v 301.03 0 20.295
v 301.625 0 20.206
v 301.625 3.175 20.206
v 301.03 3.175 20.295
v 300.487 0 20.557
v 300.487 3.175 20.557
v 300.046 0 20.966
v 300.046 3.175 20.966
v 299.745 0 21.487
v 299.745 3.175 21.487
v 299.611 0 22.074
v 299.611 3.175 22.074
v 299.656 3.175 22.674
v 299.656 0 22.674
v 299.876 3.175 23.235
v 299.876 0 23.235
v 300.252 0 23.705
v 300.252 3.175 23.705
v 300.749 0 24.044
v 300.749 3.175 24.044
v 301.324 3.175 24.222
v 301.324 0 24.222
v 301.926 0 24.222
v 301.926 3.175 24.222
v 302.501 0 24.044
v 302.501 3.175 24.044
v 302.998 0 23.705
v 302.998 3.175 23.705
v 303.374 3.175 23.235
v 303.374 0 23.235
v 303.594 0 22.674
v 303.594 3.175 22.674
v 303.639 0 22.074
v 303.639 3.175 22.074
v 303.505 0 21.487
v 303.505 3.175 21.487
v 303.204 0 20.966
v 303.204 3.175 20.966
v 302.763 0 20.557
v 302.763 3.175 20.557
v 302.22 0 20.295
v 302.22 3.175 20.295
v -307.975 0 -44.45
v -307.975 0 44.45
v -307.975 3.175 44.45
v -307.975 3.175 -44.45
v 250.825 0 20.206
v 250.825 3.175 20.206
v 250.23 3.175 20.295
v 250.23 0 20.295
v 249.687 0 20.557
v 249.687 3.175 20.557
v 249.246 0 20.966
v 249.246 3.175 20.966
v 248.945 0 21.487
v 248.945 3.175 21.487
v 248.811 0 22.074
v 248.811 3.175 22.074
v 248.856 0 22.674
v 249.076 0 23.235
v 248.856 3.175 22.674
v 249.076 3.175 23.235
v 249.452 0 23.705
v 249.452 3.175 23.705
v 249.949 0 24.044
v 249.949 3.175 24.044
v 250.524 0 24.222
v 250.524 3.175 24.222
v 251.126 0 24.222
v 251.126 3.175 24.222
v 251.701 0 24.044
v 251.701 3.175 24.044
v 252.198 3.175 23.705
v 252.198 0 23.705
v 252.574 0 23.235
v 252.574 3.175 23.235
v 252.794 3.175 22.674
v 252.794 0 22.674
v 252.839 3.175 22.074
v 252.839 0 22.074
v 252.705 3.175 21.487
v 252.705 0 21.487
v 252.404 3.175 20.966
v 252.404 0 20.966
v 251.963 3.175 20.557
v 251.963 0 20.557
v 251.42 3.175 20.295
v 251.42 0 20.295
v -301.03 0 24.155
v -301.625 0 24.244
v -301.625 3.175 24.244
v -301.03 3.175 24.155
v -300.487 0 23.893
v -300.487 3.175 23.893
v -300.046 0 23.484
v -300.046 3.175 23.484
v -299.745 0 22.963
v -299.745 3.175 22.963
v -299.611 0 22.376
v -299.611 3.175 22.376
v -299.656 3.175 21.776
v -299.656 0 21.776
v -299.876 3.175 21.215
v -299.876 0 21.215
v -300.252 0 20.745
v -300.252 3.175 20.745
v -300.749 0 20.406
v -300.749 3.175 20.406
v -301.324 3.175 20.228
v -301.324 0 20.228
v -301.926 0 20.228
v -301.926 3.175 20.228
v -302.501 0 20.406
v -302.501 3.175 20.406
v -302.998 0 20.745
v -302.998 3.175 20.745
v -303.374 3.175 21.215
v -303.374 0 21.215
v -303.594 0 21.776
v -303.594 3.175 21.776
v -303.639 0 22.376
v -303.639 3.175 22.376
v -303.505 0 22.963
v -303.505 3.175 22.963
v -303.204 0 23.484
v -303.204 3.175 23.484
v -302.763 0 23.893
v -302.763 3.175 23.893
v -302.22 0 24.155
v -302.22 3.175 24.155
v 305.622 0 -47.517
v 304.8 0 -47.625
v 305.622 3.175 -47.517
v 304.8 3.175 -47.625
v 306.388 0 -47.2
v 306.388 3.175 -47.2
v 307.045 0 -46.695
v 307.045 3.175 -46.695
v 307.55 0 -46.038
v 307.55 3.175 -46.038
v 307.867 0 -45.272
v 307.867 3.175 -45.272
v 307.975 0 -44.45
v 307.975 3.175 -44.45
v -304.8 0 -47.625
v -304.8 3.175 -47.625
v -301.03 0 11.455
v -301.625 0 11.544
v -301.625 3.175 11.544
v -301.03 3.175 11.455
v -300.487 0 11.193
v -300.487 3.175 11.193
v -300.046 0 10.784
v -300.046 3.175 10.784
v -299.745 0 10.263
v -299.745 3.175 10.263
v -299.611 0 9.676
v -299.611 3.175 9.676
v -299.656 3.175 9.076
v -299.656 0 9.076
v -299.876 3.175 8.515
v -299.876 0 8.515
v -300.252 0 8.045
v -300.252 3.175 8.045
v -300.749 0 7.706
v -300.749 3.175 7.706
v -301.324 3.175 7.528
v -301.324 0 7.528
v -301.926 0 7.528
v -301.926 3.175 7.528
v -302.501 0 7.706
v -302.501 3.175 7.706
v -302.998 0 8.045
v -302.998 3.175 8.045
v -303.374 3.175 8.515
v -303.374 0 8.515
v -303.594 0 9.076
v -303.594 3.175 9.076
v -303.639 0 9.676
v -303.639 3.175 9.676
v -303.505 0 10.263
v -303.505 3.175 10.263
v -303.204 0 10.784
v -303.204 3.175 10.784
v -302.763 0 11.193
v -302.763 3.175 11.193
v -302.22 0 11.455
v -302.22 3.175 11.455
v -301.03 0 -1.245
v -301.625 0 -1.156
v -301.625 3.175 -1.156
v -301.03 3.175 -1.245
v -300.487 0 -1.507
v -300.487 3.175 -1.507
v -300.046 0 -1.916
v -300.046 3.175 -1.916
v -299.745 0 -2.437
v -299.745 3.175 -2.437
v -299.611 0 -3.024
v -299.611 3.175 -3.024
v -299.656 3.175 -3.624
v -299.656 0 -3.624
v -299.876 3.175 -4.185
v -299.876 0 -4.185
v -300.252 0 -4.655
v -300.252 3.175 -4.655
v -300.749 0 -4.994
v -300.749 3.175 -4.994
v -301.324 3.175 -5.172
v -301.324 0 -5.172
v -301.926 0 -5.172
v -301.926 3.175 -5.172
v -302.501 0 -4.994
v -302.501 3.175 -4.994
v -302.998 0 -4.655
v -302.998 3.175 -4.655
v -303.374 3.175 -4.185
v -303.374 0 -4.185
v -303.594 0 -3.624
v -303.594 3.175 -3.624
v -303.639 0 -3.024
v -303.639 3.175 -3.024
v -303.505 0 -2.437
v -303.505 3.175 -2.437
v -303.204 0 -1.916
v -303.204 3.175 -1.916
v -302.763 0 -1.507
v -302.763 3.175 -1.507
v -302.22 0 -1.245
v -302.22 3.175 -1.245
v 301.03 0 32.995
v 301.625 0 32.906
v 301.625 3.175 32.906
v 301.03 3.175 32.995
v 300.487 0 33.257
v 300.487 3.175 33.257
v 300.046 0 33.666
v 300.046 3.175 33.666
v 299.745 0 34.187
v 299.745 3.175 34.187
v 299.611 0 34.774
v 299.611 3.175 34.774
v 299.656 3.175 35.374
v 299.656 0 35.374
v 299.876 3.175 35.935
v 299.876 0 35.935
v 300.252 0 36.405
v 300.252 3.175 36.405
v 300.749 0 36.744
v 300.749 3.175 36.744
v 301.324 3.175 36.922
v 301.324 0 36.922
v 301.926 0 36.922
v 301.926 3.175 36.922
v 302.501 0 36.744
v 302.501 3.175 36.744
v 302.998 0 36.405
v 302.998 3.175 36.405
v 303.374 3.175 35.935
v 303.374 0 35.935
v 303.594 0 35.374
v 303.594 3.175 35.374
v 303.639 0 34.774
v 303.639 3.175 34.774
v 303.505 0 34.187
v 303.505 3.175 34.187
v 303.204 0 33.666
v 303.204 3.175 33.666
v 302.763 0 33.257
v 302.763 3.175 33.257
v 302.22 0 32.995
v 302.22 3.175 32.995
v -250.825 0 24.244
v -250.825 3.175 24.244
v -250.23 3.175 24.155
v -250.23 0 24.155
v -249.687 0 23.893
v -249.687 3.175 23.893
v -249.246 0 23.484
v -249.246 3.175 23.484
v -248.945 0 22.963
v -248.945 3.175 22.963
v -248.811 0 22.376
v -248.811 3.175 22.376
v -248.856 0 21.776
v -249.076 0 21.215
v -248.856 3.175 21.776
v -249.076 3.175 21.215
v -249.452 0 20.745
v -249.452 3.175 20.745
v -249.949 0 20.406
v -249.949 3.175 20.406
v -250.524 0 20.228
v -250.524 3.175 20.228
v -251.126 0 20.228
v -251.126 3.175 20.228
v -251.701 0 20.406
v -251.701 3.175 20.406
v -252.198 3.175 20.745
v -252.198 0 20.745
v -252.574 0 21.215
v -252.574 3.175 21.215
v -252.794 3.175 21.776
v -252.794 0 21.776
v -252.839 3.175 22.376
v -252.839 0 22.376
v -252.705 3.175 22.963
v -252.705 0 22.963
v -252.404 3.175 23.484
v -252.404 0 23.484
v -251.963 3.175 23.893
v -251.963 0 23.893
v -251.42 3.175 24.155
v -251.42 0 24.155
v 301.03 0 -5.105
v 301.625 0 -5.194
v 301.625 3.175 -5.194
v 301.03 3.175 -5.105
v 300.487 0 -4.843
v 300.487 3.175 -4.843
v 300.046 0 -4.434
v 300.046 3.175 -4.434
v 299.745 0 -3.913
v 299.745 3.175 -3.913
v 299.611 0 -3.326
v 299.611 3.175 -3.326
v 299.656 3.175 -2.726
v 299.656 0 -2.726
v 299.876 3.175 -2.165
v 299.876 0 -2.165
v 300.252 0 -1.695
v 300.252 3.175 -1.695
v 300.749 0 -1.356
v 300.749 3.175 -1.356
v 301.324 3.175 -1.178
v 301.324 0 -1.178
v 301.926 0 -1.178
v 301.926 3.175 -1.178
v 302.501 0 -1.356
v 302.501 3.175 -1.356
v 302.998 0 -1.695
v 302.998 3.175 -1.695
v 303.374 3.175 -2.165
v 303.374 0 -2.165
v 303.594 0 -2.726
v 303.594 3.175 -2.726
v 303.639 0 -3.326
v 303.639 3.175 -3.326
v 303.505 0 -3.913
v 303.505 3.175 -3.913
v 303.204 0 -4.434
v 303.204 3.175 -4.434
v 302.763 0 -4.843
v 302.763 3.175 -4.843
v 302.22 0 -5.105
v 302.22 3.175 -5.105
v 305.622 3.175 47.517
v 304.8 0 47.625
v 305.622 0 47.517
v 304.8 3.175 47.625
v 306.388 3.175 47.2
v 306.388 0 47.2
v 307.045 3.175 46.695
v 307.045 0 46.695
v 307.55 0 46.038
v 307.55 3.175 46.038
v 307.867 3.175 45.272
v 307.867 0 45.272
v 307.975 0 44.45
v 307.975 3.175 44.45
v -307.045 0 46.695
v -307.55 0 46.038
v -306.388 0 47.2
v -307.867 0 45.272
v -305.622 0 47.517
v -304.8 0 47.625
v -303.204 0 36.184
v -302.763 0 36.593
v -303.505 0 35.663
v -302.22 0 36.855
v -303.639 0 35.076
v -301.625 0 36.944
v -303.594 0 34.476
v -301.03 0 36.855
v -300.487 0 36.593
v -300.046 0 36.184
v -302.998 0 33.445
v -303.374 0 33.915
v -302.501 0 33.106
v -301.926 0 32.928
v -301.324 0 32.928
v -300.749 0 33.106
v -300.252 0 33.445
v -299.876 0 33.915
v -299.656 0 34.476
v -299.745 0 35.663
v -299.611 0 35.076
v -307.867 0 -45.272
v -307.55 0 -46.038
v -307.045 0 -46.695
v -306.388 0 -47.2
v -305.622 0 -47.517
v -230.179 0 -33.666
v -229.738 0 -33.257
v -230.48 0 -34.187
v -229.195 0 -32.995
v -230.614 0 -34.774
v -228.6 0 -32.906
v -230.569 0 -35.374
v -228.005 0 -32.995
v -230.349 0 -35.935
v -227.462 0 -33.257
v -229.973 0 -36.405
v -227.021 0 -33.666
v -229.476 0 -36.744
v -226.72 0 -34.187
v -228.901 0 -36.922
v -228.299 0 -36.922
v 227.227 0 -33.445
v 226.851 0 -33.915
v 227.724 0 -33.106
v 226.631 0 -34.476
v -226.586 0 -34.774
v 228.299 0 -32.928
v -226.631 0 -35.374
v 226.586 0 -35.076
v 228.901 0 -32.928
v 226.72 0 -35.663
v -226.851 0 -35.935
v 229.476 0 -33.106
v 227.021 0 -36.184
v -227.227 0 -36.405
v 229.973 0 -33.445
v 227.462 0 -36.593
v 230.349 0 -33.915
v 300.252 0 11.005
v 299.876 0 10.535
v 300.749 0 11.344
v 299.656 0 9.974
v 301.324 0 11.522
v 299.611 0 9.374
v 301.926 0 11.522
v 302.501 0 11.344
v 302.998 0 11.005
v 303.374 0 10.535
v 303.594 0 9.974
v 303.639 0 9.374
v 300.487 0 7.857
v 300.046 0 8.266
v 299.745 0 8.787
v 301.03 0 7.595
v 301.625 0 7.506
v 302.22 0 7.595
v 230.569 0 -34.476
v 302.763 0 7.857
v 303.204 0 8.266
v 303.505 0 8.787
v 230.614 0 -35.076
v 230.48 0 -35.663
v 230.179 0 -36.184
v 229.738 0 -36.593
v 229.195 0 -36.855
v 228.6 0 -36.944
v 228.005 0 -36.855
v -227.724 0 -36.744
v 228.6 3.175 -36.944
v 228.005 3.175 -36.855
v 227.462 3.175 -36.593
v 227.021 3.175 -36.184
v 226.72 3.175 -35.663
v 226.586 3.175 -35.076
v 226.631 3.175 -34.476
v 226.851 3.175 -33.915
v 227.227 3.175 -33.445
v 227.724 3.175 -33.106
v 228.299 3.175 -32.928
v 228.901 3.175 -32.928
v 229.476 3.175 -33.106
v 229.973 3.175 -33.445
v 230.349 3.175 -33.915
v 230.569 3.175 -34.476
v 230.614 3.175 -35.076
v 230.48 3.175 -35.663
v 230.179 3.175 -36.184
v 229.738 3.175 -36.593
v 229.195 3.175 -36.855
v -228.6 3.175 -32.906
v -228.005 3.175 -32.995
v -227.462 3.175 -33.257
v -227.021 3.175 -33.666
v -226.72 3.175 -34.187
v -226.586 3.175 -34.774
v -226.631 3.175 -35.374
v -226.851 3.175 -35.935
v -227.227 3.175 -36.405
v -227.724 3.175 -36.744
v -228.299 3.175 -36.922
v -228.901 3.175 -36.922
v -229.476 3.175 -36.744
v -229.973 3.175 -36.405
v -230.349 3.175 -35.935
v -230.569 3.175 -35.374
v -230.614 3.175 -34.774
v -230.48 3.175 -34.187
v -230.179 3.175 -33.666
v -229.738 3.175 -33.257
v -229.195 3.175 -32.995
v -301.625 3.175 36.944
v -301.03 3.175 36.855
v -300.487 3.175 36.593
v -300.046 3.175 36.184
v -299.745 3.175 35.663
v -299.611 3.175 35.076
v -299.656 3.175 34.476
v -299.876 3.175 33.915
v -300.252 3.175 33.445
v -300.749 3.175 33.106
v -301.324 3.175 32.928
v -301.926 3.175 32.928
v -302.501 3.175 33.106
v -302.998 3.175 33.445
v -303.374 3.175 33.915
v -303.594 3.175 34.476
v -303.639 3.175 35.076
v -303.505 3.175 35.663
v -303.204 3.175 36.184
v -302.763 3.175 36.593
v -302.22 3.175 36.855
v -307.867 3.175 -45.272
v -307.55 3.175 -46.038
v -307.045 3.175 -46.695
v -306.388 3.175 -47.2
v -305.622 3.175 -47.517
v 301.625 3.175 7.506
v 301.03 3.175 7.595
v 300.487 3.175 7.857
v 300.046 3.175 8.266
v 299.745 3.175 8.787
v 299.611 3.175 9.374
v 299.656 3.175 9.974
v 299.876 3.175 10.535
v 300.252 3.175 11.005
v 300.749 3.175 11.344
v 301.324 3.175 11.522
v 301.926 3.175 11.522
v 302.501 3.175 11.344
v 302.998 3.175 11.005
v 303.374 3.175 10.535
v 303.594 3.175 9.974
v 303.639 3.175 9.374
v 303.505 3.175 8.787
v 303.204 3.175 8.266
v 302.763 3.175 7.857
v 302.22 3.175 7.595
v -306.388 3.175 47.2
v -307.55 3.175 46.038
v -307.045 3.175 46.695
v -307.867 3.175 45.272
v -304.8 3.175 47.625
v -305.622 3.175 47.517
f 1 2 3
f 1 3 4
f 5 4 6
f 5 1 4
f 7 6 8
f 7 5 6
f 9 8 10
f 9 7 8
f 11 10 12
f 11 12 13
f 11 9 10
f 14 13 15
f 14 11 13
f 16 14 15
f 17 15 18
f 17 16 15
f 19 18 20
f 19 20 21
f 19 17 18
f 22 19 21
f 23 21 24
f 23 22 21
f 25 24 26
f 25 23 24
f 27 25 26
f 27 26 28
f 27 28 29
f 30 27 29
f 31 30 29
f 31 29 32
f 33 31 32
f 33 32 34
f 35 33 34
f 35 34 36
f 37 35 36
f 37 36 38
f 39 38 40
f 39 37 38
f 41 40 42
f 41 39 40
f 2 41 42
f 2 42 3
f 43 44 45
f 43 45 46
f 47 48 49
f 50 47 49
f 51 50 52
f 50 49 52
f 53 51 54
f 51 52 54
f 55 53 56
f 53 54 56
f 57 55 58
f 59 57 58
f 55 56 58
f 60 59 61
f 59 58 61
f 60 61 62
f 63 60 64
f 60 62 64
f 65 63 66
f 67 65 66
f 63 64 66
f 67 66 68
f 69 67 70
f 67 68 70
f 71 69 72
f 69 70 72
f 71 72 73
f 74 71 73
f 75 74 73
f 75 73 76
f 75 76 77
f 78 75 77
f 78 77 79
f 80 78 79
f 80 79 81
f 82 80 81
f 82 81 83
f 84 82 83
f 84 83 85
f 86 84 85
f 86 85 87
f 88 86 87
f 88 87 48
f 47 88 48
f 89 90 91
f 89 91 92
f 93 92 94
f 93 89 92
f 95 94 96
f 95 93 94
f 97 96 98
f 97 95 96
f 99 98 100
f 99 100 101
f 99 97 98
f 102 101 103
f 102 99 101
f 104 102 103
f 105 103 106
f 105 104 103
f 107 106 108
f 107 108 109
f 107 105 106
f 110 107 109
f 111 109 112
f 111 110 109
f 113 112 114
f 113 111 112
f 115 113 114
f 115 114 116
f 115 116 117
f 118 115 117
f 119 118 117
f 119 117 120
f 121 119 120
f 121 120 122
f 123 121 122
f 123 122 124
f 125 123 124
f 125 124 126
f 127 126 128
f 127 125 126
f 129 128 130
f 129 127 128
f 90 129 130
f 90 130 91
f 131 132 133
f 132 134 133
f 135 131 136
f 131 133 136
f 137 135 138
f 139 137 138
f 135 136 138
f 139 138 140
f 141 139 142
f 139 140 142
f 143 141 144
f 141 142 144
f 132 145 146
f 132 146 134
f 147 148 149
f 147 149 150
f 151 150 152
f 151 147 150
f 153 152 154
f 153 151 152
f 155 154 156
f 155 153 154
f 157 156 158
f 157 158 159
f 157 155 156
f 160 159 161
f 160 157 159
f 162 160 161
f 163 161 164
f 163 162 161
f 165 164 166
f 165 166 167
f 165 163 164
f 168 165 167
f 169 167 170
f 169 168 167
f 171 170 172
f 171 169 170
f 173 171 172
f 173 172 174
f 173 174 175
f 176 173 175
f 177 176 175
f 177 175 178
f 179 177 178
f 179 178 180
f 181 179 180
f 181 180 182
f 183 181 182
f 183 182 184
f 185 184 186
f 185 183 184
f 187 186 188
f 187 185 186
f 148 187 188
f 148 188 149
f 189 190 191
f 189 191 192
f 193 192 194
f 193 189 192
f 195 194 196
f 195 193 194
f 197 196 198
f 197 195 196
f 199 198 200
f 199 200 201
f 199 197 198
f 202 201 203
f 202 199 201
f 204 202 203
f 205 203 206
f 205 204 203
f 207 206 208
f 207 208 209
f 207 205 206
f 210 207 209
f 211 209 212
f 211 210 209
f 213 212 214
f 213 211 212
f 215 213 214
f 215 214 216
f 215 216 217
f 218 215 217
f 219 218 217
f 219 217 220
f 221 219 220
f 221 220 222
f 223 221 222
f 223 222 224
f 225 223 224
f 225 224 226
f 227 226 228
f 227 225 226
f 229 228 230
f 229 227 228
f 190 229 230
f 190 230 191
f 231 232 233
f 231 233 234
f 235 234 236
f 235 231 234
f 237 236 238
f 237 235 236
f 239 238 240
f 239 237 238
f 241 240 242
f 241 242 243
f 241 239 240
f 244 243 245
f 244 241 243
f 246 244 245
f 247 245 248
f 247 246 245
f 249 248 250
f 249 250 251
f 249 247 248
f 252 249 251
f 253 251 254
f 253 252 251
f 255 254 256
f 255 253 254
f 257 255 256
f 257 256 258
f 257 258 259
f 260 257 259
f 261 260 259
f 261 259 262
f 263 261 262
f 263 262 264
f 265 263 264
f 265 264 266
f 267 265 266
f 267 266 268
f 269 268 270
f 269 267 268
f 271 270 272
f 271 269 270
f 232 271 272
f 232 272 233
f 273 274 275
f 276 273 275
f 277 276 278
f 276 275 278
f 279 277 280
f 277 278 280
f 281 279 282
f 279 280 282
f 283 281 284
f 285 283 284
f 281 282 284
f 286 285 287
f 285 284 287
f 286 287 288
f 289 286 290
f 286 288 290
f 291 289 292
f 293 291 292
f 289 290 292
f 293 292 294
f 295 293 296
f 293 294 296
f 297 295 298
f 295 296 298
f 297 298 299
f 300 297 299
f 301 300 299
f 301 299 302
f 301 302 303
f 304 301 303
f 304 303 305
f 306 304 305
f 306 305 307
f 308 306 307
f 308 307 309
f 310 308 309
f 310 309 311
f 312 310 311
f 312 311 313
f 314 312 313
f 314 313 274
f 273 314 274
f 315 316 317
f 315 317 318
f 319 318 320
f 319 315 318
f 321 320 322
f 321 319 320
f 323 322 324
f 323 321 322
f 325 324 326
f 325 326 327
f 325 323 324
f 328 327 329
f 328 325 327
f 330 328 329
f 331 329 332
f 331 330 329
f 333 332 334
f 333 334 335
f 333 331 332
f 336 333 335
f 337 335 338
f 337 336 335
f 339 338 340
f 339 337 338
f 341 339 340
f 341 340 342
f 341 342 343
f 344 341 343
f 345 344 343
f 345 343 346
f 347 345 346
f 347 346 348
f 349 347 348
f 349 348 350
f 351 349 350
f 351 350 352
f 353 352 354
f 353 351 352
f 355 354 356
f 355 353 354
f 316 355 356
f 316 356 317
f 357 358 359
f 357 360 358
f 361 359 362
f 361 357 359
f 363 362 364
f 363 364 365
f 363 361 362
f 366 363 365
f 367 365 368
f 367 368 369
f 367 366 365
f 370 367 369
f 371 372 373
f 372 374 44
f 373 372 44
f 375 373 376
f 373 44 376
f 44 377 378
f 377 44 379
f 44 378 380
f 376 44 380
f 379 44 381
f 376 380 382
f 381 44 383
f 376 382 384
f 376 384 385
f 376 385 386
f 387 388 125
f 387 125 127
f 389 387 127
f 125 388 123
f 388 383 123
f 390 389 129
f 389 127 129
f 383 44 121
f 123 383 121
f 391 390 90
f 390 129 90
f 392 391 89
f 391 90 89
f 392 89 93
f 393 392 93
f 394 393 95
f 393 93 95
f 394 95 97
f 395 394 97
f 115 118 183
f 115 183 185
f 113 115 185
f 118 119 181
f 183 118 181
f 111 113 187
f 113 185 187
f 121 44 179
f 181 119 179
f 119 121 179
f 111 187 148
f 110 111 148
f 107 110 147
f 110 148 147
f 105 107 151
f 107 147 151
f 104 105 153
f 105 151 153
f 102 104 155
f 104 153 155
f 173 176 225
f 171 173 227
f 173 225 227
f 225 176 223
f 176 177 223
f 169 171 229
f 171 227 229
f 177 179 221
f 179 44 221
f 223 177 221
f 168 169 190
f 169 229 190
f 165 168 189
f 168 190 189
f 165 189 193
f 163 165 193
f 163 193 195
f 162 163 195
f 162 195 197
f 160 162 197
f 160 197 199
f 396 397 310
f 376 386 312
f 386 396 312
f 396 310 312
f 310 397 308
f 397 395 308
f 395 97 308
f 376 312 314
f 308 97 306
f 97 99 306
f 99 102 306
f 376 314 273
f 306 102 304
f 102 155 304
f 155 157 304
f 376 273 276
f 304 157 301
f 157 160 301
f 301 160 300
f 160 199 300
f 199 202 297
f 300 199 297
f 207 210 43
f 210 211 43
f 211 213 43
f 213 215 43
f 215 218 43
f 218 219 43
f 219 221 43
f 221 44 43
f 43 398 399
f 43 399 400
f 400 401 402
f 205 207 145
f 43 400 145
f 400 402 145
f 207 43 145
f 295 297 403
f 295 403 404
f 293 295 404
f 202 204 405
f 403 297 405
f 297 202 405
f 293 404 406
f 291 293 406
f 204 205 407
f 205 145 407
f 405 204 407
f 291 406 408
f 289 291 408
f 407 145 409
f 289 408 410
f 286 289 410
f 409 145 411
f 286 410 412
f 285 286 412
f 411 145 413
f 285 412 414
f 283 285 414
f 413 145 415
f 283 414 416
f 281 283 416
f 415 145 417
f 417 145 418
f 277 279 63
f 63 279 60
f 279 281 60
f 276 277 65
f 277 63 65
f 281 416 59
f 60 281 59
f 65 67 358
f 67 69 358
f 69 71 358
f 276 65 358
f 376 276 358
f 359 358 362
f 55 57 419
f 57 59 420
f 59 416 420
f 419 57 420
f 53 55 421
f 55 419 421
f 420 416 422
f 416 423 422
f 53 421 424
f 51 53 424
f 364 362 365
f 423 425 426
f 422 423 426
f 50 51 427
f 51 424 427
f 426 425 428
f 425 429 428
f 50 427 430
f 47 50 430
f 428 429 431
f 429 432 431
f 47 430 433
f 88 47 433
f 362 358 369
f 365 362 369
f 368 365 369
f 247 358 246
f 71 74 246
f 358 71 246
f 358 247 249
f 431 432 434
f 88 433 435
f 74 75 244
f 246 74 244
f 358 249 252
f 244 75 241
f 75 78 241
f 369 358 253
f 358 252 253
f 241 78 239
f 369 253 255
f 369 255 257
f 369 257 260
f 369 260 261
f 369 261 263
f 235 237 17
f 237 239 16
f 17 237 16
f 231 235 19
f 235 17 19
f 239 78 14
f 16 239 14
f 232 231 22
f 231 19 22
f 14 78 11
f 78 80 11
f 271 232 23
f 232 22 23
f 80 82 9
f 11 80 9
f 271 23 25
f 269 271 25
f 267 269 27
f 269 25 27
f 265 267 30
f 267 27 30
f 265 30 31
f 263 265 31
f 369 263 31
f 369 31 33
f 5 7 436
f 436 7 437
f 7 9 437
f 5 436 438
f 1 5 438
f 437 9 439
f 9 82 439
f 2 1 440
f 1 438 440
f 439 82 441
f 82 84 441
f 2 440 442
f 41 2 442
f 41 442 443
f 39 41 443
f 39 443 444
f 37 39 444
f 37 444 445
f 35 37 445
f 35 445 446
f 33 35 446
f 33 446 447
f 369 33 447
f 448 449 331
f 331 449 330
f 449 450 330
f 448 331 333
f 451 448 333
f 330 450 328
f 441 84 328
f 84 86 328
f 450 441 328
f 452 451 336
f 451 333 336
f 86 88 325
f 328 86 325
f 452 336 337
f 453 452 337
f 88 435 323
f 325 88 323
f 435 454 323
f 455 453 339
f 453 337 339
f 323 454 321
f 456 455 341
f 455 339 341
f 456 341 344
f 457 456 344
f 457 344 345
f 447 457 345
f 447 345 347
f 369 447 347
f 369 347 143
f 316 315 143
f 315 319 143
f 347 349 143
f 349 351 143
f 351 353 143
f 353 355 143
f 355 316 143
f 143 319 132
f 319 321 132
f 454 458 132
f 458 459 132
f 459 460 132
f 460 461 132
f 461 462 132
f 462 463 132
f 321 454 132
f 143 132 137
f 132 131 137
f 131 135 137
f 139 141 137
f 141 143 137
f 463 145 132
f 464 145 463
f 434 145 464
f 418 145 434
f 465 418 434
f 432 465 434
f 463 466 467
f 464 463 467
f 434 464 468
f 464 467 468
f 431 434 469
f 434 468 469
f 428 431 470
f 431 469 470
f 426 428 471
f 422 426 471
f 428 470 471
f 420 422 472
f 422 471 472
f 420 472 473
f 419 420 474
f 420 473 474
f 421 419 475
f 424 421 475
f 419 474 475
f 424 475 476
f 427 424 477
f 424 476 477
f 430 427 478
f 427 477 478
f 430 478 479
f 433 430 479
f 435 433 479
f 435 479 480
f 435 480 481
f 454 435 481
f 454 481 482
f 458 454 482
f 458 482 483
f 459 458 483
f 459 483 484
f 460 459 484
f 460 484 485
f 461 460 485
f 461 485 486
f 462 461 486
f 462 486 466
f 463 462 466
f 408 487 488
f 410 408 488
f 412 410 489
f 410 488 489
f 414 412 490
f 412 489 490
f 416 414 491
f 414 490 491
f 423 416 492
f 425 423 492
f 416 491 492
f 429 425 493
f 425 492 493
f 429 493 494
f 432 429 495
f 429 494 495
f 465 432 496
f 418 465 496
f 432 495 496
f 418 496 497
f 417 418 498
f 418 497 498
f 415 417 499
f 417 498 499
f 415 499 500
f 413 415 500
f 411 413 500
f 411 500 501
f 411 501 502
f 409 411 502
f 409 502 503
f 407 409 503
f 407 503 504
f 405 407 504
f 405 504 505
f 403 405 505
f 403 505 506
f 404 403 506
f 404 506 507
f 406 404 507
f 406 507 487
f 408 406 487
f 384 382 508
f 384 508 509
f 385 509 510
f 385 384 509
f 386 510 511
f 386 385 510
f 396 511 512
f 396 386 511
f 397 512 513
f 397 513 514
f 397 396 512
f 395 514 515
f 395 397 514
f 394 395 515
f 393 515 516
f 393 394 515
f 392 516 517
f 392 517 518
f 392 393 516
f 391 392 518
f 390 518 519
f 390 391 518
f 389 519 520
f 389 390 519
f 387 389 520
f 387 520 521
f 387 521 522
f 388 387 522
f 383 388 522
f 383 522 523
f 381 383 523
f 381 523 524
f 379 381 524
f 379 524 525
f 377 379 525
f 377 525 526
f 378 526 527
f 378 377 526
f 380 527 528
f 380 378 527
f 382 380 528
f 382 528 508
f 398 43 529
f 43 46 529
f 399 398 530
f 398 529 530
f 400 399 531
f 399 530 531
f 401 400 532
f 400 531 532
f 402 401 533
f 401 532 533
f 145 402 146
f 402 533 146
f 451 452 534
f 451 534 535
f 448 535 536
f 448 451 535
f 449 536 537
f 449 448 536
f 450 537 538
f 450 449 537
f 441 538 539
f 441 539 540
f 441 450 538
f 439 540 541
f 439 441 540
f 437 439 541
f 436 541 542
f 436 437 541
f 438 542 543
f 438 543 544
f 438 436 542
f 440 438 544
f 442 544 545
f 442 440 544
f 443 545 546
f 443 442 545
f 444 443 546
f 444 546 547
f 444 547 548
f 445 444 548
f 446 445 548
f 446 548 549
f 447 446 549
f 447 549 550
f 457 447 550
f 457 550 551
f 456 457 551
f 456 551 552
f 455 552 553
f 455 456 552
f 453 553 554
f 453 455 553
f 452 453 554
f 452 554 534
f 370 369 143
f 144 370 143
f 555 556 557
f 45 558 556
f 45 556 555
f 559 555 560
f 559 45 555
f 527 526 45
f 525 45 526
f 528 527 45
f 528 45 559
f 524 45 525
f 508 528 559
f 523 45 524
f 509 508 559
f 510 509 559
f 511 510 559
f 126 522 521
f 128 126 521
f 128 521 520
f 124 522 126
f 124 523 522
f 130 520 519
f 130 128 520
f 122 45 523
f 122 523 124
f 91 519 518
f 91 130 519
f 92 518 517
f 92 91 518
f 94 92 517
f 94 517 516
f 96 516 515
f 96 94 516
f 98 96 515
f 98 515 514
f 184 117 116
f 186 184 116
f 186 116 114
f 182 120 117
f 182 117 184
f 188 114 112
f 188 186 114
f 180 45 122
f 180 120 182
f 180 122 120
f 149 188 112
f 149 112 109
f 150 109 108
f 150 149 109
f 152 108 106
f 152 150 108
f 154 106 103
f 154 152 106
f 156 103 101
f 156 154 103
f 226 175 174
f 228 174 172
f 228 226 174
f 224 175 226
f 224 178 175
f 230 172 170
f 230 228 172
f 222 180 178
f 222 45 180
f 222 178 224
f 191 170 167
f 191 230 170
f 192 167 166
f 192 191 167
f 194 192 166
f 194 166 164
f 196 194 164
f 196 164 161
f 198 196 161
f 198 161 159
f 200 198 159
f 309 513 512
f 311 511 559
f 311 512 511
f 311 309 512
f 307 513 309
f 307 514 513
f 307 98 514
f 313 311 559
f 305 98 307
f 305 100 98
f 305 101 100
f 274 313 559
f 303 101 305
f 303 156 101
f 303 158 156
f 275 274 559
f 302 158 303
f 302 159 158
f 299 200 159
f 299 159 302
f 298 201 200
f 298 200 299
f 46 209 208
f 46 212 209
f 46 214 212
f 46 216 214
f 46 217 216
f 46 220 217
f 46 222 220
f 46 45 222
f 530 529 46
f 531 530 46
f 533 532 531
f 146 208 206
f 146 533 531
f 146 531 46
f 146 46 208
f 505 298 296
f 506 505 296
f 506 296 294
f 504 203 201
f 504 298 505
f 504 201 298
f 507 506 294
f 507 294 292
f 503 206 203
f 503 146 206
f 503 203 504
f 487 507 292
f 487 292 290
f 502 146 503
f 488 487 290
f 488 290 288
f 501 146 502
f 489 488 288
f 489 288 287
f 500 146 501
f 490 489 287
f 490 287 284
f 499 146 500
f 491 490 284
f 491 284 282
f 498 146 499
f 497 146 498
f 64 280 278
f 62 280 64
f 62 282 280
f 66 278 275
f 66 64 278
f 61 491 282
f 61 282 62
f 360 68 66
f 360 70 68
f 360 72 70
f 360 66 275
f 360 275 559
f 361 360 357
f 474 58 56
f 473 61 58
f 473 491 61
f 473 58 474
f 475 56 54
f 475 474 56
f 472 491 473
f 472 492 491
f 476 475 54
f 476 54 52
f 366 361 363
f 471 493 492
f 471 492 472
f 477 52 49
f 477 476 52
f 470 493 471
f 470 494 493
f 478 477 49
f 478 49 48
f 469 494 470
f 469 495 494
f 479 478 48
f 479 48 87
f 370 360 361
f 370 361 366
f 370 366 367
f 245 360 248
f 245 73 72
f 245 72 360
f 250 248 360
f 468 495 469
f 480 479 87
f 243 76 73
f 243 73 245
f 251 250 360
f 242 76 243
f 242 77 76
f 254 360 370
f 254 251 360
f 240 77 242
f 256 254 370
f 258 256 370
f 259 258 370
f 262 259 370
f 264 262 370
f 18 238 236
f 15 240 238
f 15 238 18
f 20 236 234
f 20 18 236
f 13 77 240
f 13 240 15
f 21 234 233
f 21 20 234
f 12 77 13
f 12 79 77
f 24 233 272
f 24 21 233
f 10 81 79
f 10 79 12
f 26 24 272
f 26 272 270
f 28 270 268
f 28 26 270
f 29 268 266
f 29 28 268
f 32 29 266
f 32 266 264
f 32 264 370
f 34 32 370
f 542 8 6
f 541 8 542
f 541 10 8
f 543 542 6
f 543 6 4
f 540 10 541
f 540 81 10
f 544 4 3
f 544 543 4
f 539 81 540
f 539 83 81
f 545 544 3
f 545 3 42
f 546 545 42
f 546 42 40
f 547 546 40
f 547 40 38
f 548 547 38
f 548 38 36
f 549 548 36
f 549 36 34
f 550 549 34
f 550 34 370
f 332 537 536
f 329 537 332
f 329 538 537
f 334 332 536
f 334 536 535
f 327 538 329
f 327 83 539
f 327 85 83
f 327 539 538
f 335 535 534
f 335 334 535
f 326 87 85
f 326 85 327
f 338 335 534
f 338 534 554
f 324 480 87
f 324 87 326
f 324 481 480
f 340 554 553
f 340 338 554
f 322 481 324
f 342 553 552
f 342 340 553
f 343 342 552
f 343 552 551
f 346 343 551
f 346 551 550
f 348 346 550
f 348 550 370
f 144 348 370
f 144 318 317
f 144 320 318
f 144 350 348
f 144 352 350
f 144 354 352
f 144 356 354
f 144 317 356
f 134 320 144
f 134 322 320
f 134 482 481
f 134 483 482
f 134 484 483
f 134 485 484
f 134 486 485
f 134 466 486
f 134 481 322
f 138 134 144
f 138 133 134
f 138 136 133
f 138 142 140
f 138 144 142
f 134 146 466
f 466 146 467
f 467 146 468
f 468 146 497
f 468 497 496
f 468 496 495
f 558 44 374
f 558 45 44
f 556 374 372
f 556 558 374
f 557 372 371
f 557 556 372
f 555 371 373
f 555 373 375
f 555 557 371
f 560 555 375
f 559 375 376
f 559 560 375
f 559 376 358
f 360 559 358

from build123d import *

# Parameters (mm, degrees)
SKETCH1_W           = 615.95
SKETCH1_H           = 95.25
SKETCH1_R           = 2.0193
BOSS_EXTRUDE1_DEPTH = 3.175
FILLET1_R           = 3.175
SKETCH2_R           = 2.0193
CUT_EXTRUDE1_DEPTH  = 312.651763793


with BuildPart() as part:
    # Sketch1 → Boss-Extrude1 (new body)
    with BuildSketch(Plane(origin=(0, 0, 0), x_dir=(1, 0, 0), z_dir=(0, 1, 0))):
        Rectangle(SKETCH1_W, SKETCH1_H)
        with Locations(Location((-301.625, 3.175, 0), (0, 0, 270))):
            Circle(SKETCH1_R, mode=Mode.SUBTRACT)
        with Locations(Location((-301.625, -9.525, 0), (0, 0, 270))):
            Circle(SKETCH1_R, mode=Mode.SUBTRACT)
        with Locations(Location((-301.625, -22.225, 0), (0, 0, 270))):
            Circle(SKETCH1_R, mode=Mode.SUBTRACT)
        with Locations(Location((-301.625, -34.925, 0), (0, 0, 270))):
            Circle(SKETCH1_R, mode=Mode.SUBTRACT)
        with Locations(Location((301.625, -34.925, 0), (0, 0, 90))):
            Circle(SKETCH1_R, mode=Mode.SUBTRACT)
        with Locations(Location((301.625, -22.225, 0), (0, 0, 90))):
            Circle(SKETCH1_R, mode=Mode.SUBTRACT)
        with Locations(Location((301.625, -9.525, 0), (0, 0, 90))):
            Circle(SKETCH1_R, mode=Mode.SUBTRACT)
        with Locations(Location((301.625, 3.175, 0), (0, 0, 90))):
            Circle(SKETCH1_R, mode=Mode.SUBTRACT)
    extrude(amount=BOSS_EXTRUDE1_DEPTH)

    # Fillet1
    fillet1_edges = [part.edges().sort_by_distance(p)[0] for p in [
        (307.975, 1.5875, 47.625),
        (-307.975, 1.5875, 47.625),
        (-307.975, 1.5875, -47.625),
        (307.975, 1.5875, -47.625),
    ]]
    fillet(fillet1_edges, radius=FILLET1_R)

    # Sketch2 → Cut-Extrude1 (cut, through all)
    with BuildSketch(Plane(origin=(0, 3.175, 0), x_dir=(1, 0, 0), z_dir=(0, 1, 0))):
        with Locations(Location((-228.6, 34.925, 0), (0, 0, 270))):
            Circle(SKETCH2_R)
        with Locations(Location((-250.825, -22.225, 0), (0, 0, 270))):
            Circle(SKETCH2_R)
        with Locations(Location((250.825, -22.225, 0), (0, 0, 90))):
            Circle(SKETCH2_R)
        with Locations(Location((228.6, 34.925, 0), (0, 0, 90))):
            Circle(SKETCH2_R)
    extrude(amount=-CUT_EXTRUDE1_DEPTH, mode=Mode.SUBTRACT)


solid = part.part
